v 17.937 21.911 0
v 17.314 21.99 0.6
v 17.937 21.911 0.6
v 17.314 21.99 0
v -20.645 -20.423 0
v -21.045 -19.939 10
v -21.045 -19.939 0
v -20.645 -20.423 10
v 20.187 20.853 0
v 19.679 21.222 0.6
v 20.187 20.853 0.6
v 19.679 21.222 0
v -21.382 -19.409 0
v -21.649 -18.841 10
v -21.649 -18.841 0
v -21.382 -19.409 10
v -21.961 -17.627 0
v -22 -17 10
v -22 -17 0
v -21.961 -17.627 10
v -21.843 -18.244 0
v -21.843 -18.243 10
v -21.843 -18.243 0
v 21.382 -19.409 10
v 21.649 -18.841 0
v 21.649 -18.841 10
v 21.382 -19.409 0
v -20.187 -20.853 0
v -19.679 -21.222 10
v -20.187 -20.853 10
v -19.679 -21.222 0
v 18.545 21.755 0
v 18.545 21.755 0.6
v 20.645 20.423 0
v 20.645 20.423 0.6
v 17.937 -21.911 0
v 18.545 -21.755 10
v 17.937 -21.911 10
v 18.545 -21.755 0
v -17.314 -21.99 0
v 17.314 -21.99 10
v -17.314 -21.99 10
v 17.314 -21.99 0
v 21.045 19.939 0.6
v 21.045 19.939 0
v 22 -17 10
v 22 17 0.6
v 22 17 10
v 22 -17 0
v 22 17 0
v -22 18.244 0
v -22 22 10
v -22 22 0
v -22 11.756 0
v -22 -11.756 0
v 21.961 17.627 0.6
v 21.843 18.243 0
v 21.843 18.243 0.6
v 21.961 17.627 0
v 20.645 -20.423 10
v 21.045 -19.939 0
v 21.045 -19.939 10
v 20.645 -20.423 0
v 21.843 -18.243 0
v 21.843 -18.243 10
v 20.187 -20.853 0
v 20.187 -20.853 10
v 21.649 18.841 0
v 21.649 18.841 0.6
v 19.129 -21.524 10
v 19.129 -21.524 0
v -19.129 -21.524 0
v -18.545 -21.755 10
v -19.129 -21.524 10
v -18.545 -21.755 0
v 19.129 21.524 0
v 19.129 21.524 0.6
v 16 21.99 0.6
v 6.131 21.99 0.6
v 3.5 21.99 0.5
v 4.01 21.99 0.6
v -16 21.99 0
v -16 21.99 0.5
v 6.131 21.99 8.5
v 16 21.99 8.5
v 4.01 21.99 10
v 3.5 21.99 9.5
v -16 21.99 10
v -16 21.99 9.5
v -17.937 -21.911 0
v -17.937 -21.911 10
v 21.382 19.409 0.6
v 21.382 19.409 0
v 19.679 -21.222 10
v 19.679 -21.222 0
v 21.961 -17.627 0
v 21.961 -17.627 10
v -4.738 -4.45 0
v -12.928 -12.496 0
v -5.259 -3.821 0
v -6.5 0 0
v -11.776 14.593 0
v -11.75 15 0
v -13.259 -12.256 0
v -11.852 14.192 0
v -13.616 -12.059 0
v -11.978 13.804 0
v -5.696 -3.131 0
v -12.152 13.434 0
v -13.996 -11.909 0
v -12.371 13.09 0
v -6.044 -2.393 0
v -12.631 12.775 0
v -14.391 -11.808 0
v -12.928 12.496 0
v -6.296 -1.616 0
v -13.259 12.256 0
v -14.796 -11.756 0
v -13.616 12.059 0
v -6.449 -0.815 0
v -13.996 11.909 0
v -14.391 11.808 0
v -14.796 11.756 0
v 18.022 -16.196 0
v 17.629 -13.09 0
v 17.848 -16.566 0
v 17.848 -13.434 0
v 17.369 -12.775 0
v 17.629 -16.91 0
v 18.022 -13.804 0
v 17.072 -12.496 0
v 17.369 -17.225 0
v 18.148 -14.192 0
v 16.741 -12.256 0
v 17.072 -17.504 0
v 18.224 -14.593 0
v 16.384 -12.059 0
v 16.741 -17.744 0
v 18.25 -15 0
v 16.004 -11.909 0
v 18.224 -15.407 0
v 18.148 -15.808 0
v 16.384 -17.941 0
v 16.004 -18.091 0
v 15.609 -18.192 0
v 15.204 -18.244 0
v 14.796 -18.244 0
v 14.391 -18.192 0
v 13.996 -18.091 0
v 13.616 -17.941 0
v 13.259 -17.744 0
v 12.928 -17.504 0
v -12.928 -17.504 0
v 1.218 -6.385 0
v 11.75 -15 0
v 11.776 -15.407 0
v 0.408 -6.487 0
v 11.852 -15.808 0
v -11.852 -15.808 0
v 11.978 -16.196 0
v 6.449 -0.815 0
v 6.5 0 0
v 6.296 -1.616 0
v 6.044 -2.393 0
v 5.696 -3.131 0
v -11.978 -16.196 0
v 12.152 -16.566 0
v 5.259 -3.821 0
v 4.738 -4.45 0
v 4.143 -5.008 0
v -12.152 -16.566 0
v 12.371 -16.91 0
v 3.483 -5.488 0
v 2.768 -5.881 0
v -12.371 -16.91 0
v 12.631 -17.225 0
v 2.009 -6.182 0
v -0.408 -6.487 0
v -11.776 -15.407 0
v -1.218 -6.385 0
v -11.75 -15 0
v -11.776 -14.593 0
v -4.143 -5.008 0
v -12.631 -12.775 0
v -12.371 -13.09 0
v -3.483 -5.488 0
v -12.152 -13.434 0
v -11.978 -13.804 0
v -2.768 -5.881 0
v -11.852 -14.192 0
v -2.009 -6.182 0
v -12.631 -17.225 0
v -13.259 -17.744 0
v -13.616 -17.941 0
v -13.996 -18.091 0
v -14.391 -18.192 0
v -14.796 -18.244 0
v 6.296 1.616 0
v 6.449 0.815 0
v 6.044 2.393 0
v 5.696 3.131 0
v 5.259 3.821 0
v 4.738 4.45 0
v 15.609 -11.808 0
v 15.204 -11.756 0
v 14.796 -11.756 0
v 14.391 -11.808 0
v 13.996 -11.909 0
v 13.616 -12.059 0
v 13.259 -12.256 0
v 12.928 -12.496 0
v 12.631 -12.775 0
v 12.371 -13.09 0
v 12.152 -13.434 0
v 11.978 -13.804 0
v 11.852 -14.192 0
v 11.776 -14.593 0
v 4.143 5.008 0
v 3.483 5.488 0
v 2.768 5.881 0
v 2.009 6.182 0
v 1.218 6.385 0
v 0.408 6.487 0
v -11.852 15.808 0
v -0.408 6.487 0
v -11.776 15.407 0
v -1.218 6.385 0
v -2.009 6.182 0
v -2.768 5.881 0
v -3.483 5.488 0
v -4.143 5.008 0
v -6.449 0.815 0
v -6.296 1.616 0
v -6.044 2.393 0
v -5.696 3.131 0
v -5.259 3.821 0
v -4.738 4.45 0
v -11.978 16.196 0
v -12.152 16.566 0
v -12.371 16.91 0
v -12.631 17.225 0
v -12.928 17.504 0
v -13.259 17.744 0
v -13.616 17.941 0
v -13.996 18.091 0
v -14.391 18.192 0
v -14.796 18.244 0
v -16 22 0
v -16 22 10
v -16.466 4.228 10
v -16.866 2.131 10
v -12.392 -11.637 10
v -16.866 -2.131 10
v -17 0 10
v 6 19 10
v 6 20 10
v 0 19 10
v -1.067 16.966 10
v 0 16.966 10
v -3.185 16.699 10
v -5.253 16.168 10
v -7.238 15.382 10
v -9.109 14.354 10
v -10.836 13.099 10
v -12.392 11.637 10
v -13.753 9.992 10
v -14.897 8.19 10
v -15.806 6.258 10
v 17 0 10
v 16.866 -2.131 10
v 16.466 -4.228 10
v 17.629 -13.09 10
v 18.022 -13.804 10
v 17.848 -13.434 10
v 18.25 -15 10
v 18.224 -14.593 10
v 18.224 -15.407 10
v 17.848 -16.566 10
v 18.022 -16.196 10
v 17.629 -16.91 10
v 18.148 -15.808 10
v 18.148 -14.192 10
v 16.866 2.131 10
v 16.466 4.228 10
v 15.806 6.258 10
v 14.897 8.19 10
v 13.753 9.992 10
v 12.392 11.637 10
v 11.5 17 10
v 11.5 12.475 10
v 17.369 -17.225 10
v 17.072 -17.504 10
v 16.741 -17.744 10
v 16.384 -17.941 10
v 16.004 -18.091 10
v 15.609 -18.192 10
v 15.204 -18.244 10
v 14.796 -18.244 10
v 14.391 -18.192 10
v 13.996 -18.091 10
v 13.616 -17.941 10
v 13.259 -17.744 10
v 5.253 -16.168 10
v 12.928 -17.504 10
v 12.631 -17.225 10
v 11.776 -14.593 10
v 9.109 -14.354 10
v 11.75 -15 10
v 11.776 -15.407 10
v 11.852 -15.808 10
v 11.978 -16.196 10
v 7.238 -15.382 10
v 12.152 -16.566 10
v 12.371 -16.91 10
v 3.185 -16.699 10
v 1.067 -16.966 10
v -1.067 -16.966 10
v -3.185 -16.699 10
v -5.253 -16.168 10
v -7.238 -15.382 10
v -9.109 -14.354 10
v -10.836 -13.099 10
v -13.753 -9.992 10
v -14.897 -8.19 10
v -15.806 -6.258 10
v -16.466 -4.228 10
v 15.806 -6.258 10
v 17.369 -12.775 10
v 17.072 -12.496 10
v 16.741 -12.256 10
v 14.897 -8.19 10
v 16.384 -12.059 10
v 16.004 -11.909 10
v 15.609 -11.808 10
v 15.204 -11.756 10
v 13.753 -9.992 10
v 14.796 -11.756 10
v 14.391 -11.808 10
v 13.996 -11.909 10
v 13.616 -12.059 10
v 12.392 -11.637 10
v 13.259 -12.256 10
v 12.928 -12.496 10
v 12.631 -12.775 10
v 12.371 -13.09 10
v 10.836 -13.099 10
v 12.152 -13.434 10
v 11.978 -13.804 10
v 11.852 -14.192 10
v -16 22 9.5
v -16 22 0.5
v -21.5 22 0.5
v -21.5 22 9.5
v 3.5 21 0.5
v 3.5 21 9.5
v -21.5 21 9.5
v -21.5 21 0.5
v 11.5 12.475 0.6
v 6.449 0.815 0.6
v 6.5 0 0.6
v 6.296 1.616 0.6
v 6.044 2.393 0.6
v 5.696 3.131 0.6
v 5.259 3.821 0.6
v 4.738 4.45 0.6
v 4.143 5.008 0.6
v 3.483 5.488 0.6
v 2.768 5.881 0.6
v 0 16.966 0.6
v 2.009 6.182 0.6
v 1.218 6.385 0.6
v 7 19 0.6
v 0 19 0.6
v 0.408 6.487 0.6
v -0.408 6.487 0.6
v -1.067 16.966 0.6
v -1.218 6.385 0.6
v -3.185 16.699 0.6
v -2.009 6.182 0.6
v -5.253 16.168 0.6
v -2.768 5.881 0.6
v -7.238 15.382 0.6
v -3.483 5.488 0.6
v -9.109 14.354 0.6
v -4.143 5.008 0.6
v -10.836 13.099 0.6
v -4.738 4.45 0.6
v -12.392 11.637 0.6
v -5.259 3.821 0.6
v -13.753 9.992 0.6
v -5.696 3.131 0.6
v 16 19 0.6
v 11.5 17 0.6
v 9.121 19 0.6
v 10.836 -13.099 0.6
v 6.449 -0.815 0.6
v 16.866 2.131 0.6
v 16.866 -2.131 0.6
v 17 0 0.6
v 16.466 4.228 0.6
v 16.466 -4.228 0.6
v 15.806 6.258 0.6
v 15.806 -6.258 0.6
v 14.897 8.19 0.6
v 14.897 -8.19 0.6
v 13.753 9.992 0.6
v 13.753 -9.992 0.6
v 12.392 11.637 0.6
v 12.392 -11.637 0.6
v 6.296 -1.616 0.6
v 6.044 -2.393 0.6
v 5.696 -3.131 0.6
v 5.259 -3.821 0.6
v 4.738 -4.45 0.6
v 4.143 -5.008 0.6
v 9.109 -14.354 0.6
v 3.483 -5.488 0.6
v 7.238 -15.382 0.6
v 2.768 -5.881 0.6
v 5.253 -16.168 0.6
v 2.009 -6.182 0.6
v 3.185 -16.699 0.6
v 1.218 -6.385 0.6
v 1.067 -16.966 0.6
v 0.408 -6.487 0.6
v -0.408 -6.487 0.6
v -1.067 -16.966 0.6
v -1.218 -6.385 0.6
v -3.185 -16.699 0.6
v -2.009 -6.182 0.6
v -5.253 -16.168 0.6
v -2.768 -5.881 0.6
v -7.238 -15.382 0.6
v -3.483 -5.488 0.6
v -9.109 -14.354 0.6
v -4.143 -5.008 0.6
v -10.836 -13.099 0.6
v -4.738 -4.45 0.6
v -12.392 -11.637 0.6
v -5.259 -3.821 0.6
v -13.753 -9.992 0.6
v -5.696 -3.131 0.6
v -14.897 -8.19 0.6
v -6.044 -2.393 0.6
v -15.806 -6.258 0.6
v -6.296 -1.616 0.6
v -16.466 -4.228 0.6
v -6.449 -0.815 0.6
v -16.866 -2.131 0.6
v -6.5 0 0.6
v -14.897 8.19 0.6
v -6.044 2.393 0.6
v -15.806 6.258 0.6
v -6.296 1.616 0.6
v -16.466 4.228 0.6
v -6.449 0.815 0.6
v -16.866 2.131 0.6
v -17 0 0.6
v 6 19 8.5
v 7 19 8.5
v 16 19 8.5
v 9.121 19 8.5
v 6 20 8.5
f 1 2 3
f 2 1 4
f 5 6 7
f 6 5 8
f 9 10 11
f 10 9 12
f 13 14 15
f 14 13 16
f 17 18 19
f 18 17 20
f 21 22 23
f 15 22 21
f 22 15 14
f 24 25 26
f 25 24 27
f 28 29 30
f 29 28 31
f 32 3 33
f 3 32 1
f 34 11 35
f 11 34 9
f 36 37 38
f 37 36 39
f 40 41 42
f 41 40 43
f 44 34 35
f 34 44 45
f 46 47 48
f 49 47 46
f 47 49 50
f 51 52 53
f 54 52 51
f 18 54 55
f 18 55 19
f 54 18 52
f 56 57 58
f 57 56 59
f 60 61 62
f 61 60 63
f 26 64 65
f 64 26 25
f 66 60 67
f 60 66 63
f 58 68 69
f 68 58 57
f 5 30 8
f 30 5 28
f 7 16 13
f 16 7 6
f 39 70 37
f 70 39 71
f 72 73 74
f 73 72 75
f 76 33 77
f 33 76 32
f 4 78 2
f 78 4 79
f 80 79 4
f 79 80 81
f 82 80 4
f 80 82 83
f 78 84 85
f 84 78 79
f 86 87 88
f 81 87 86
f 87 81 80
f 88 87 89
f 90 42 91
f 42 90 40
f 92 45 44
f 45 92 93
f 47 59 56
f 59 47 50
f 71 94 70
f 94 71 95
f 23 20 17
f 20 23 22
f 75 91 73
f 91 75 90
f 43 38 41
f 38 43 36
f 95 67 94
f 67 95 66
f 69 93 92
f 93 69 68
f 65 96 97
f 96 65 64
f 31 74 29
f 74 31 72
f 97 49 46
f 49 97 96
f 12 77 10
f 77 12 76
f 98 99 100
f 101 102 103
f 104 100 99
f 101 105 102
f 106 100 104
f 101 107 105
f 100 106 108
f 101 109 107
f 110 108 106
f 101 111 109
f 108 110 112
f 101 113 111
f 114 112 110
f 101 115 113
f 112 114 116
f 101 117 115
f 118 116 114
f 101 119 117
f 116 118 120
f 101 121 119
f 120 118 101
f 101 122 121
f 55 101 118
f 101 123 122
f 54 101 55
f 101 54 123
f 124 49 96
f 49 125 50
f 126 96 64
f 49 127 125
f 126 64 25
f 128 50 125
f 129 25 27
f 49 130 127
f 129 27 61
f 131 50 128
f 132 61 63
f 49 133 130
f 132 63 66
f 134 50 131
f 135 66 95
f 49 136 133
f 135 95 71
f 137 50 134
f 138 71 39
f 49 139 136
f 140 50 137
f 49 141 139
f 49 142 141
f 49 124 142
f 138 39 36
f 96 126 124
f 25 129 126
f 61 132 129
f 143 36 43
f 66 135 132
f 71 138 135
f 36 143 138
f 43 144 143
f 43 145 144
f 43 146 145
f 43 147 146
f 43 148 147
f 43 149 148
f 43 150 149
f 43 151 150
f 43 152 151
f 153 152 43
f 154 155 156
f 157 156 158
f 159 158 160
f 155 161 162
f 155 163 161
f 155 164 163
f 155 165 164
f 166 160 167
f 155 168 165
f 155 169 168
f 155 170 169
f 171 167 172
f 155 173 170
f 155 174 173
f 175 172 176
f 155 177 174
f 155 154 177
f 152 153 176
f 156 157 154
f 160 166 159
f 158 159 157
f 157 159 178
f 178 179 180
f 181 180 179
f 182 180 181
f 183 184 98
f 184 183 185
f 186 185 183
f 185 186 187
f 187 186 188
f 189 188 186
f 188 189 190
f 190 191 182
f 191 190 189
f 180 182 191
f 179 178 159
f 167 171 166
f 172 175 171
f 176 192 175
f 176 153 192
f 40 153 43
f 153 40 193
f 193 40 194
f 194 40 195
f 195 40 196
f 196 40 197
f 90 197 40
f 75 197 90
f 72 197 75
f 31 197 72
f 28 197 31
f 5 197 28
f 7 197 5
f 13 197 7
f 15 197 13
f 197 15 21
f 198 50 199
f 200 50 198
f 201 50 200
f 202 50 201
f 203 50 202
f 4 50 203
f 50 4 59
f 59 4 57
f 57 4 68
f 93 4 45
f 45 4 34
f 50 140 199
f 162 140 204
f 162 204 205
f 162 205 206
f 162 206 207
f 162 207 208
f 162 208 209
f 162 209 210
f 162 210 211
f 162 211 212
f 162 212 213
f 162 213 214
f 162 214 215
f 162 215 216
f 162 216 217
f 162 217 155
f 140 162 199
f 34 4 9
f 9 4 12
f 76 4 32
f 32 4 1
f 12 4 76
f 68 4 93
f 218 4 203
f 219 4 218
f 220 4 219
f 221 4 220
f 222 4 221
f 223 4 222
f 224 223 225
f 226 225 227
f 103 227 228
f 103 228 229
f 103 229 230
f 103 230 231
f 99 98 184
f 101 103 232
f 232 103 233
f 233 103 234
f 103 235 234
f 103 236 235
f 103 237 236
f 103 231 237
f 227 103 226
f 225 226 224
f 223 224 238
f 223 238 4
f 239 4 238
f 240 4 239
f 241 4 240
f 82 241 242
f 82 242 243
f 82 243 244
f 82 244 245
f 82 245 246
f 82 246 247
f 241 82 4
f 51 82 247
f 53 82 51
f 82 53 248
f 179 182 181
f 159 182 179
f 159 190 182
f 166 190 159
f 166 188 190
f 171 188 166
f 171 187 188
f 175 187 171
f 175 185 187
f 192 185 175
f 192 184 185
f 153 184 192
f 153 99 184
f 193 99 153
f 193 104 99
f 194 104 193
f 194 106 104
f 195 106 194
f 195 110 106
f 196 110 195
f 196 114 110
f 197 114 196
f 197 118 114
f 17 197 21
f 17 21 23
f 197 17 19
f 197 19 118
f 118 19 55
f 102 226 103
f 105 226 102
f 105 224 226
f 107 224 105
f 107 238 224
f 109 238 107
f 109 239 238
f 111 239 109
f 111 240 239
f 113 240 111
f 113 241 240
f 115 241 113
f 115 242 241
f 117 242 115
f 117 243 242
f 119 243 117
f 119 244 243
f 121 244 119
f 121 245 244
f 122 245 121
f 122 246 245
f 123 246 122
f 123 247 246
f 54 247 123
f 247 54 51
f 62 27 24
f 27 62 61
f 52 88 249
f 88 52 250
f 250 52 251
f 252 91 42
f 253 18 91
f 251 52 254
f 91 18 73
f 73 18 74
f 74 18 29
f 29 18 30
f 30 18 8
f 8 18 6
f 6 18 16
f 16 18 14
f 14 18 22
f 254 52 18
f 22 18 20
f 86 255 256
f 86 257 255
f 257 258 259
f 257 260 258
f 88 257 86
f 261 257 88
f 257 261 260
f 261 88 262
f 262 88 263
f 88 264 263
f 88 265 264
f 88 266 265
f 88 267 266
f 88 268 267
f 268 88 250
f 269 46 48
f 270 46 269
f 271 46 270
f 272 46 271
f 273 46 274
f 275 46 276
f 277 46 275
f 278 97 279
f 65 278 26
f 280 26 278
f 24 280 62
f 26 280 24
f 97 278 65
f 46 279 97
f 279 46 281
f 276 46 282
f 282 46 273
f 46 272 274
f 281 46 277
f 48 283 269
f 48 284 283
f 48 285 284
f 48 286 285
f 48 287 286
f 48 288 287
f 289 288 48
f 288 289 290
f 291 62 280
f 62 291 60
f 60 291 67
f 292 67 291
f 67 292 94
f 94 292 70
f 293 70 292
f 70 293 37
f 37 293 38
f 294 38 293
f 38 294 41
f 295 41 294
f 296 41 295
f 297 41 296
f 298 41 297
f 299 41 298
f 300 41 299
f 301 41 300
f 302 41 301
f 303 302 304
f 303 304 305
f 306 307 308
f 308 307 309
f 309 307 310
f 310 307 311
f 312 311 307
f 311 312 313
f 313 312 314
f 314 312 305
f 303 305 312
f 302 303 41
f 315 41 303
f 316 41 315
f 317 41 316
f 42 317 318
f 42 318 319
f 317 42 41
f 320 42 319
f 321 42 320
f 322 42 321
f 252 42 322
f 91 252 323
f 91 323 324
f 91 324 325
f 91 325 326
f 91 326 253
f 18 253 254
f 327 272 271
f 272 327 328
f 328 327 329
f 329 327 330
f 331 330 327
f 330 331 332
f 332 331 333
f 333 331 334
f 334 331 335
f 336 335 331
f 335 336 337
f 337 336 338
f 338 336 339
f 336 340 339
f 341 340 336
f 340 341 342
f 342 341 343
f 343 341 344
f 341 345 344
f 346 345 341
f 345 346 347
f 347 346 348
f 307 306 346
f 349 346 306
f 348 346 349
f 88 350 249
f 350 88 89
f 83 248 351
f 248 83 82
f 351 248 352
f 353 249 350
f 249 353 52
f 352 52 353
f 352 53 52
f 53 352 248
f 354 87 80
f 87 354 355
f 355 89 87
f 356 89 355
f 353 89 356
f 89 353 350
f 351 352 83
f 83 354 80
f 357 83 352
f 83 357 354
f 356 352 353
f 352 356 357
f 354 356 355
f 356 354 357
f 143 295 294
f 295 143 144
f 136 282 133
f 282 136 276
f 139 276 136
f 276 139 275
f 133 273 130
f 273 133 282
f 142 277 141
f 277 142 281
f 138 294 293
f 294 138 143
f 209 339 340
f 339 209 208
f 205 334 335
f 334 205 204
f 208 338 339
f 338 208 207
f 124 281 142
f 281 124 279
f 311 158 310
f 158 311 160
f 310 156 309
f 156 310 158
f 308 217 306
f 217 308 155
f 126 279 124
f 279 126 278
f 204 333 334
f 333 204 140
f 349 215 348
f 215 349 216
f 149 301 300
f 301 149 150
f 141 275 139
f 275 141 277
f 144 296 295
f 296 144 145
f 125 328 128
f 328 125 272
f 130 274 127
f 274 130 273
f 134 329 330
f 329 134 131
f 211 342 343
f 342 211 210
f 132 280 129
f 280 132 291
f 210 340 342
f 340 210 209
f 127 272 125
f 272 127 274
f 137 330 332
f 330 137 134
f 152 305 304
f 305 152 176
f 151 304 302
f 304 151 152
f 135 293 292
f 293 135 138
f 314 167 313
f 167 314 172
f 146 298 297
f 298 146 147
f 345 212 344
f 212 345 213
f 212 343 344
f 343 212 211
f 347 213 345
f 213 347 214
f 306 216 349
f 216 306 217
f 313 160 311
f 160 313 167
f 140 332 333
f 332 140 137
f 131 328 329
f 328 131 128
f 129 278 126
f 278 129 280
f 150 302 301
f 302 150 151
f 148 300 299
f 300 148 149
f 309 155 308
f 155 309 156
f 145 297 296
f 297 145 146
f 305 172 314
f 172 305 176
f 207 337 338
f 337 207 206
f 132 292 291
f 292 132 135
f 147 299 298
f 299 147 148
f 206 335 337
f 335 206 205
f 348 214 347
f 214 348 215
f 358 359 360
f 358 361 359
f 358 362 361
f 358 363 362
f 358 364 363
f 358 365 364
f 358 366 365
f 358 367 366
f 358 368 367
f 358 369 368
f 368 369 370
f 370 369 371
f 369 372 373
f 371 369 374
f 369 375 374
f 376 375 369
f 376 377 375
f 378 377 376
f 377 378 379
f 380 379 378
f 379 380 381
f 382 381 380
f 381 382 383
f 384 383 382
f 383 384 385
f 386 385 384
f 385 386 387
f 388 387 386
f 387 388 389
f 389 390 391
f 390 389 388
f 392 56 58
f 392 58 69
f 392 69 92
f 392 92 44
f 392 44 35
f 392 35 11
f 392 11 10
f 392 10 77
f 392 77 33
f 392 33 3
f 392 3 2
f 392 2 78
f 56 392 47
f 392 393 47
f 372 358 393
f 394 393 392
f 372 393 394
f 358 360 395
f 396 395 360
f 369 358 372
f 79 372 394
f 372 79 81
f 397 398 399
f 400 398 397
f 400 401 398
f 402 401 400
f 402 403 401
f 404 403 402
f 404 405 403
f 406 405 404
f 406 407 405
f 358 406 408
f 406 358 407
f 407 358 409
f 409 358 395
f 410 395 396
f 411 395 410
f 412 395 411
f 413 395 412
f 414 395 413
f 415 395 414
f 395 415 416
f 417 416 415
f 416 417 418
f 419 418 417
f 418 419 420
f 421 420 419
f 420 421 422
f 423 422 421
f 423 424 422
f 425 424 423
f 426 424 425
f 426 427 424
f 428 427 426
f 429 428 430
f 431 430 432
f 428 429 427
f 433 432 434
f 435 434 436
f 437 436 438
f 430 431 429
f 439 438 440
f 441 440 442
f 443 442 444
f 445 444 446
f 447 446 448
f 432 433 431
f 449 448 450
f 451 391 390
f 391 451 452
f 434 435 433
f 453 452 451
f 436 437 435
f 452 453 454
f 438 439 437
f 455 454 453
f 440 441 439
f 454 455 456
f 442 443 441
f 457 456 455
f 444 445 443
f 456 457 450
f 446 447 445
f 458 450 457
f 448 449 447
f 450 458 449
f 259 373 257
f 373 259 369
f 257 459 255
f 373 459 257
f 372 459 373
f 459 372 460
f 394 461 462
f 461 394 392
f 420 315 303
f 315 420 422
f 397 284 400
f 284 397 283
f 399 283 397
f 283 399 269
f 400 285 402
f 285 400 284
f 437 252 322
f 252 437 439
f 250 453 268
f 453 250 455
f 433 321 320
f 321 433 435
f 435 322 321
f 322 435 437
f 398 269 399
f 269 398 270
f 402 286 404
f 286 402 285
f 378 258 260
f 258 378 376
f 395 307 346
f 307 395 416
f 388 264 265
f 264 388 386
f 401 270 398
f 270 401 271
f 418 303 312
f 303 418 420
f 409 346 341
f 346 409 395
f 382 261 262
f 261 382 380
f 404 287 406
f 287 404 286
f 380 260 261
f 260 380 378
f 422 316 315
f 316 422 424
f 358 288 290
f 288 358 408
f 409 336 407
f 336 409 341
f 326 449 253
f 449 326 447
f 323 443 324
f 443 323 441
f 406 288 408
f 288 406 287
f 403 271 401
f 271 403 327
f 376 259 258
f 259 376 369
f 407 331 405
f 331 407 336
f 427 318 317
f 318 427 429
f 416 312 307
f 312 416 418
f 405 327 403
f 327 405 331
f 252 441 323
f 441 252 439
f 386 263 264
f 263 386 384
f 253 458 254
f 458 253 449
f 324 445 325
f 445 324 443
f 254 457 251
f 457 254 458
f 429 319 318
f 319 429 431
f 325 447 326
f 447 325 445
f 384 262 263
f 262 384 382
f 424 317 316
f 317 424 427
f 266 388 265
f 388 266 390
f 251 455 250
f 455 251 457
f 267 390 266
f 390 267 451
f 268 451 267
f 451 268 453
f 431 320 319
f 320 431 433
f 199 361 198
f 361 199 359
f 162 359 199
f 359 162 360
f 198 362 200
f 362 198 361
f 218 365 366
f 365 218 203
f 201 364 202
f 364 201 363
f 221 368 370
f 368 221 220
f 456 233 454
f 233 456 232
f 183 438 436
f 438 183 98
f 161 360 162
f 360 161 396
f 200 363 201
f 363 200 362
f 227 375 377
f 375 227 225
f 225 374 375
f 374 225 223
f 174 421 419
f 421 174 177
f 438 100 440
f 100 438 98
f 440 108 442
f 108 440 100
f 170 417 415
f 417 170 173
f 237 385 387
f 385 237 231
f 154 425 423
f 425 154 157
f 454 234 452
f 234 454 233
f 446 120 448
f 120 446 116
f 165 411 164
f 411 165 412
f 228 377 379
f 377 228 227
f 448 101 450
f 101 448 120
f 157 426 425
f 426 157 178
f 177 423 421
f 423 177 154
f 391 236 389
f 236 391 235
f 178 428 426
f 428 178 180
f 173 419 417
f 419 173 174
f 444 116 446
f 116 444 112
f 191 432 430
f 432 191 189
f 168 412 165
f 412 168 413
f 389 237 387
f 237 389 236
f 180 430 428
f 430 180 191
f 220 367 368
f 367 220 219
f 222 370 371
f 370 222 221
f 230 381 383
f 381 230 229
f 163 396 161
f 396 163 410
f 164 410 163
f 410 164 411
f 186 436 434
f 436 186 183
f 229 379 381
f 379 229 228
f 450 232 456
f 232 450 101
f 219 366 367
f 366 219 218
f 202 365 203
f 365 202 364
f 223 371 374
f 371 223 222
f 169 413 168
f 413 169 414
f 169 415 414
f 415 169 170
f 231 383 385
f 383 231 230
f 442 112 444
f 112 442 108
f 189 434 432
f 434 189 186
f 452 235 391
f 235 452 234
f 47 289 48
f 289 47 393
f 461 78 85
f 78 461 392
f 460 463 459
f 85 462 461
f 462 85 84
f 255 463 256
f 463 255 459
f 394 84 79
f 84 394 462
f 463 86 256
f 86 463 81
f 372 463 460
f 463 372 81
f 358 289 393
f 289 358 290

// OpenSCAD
$fn = 50;


difference() {
	union() {
		hull() {
			translate(v = [-17.0000000000, 17.0000000000, 0]) {
				cylinder(h = 10, r = 5);
			}
			translate(v = [17.0000000000, 17.0000000000, 0]) {
				cylinder(h = 10, r = 5);
			}
			translate(v = [-17.0000000000, -17.0000000000, 0]) {
				cylinder(h = 10, r = 5);
			}
			translate(v = [17.0000000000, -17.0000000000, 0]) {
				cylinder(h = 10, r = 5);
			}
		}
		translate(v = [-22.0000000000, 16.0000000000, 0]) {
			cube(size = [6, 6, 10]);
		}
	}
	union() {
		translate(v = [-22.5000000000, -15.0000000000, -250.0000000000]) {
			rotate(a = [0, 0, 0]) {
				difference() {
					union() {
						hull() {
							translate(v = [7.5000000000, 0, 0]) {
								cylinder(h = 250, r = 3.2500000000, r1 = 3.2500000000, r2 = 3.2500000000);
							}
							translate(v = [-7.5000000000, 0, 0]) {
								cylinder(h = 250, r = 3.2500000000, r1 = 3.2500000000, r2 = 3.2500000000);
							}
						}
					}
					union();
				}
			}
		}
		translate(v = [-22.5000000000, 15.0000000000, -250.0000000000]) {
			rotate(a = [0, 0, 0]) {
				difference() {
					union() {
						hull() {
							translate(v = [7.5000000000, 0, 0]) {
								cylinder(h = 250, r = 3.2500000000, r1 = 3.2500000000, r2 = 3.2500000000);
							}
							translate(v = [-7.5000000000, 0, 0]) {
								cylinder(h = 250, r = 3.2500000000, r1 = 3.2500000000, r2 = 3.2500000000);
							}
						}
					}
					union();
				}
			}
		}
		translate(v = [-21.5000000000, 21.0000000000, 0.5000000000]) {
			cube(size = [25, 1, 9.0000000000]);
		}
		translate(v = [15.0000000000, -15.0000000000, -50.0000000000]) {
			cylinder(h = 100, r = 3.2500000000);
		}
		translate(v = [0.0000000000, 11.0000000000, 0.6000000000]) {
			cube(size = [11, 8, 12.4000000000]);
		}
		translate(v = [0, 0, 0.6000000000]) {
			cylinder(h = 12.4000000000, r = 17.0000000000);
		}
		translate(v = [0, 0, -5.0000000000]) {
			cylinder(h = 10, r = 6.5000000000);
		}
		translate(v = [0.0000000000, 17.0000000000, 0.6000000000]) {
			cube(size = [22.0000000000, 2, 12.4000000000]);
		}
		translate(v = [16.0000000000, 17.0000000000, 0.6000000000]) {
			cube(size = [6, 5, 12.4000000000]);
		}
		translate(v = [6.0000000000, 17.0000000000, 8.5000000000]) {
			cube(size = [16, 5, 1.5000000000]);
		}
		translate(v = [3.2500000000, 22.7500000000, 0.6000000000]) {
			rotate(a = [0, 0, -45]) {
				cube(size = [7.5000000000, 1.5000000000, 12.4000000000]);
			}
		}
		translate(v = [2.5000000000, 12.0000000000, 0.6000000000]) {
			cube(size = [9.0000000000, 5, 9.4000000000]);
		}
	}
}
